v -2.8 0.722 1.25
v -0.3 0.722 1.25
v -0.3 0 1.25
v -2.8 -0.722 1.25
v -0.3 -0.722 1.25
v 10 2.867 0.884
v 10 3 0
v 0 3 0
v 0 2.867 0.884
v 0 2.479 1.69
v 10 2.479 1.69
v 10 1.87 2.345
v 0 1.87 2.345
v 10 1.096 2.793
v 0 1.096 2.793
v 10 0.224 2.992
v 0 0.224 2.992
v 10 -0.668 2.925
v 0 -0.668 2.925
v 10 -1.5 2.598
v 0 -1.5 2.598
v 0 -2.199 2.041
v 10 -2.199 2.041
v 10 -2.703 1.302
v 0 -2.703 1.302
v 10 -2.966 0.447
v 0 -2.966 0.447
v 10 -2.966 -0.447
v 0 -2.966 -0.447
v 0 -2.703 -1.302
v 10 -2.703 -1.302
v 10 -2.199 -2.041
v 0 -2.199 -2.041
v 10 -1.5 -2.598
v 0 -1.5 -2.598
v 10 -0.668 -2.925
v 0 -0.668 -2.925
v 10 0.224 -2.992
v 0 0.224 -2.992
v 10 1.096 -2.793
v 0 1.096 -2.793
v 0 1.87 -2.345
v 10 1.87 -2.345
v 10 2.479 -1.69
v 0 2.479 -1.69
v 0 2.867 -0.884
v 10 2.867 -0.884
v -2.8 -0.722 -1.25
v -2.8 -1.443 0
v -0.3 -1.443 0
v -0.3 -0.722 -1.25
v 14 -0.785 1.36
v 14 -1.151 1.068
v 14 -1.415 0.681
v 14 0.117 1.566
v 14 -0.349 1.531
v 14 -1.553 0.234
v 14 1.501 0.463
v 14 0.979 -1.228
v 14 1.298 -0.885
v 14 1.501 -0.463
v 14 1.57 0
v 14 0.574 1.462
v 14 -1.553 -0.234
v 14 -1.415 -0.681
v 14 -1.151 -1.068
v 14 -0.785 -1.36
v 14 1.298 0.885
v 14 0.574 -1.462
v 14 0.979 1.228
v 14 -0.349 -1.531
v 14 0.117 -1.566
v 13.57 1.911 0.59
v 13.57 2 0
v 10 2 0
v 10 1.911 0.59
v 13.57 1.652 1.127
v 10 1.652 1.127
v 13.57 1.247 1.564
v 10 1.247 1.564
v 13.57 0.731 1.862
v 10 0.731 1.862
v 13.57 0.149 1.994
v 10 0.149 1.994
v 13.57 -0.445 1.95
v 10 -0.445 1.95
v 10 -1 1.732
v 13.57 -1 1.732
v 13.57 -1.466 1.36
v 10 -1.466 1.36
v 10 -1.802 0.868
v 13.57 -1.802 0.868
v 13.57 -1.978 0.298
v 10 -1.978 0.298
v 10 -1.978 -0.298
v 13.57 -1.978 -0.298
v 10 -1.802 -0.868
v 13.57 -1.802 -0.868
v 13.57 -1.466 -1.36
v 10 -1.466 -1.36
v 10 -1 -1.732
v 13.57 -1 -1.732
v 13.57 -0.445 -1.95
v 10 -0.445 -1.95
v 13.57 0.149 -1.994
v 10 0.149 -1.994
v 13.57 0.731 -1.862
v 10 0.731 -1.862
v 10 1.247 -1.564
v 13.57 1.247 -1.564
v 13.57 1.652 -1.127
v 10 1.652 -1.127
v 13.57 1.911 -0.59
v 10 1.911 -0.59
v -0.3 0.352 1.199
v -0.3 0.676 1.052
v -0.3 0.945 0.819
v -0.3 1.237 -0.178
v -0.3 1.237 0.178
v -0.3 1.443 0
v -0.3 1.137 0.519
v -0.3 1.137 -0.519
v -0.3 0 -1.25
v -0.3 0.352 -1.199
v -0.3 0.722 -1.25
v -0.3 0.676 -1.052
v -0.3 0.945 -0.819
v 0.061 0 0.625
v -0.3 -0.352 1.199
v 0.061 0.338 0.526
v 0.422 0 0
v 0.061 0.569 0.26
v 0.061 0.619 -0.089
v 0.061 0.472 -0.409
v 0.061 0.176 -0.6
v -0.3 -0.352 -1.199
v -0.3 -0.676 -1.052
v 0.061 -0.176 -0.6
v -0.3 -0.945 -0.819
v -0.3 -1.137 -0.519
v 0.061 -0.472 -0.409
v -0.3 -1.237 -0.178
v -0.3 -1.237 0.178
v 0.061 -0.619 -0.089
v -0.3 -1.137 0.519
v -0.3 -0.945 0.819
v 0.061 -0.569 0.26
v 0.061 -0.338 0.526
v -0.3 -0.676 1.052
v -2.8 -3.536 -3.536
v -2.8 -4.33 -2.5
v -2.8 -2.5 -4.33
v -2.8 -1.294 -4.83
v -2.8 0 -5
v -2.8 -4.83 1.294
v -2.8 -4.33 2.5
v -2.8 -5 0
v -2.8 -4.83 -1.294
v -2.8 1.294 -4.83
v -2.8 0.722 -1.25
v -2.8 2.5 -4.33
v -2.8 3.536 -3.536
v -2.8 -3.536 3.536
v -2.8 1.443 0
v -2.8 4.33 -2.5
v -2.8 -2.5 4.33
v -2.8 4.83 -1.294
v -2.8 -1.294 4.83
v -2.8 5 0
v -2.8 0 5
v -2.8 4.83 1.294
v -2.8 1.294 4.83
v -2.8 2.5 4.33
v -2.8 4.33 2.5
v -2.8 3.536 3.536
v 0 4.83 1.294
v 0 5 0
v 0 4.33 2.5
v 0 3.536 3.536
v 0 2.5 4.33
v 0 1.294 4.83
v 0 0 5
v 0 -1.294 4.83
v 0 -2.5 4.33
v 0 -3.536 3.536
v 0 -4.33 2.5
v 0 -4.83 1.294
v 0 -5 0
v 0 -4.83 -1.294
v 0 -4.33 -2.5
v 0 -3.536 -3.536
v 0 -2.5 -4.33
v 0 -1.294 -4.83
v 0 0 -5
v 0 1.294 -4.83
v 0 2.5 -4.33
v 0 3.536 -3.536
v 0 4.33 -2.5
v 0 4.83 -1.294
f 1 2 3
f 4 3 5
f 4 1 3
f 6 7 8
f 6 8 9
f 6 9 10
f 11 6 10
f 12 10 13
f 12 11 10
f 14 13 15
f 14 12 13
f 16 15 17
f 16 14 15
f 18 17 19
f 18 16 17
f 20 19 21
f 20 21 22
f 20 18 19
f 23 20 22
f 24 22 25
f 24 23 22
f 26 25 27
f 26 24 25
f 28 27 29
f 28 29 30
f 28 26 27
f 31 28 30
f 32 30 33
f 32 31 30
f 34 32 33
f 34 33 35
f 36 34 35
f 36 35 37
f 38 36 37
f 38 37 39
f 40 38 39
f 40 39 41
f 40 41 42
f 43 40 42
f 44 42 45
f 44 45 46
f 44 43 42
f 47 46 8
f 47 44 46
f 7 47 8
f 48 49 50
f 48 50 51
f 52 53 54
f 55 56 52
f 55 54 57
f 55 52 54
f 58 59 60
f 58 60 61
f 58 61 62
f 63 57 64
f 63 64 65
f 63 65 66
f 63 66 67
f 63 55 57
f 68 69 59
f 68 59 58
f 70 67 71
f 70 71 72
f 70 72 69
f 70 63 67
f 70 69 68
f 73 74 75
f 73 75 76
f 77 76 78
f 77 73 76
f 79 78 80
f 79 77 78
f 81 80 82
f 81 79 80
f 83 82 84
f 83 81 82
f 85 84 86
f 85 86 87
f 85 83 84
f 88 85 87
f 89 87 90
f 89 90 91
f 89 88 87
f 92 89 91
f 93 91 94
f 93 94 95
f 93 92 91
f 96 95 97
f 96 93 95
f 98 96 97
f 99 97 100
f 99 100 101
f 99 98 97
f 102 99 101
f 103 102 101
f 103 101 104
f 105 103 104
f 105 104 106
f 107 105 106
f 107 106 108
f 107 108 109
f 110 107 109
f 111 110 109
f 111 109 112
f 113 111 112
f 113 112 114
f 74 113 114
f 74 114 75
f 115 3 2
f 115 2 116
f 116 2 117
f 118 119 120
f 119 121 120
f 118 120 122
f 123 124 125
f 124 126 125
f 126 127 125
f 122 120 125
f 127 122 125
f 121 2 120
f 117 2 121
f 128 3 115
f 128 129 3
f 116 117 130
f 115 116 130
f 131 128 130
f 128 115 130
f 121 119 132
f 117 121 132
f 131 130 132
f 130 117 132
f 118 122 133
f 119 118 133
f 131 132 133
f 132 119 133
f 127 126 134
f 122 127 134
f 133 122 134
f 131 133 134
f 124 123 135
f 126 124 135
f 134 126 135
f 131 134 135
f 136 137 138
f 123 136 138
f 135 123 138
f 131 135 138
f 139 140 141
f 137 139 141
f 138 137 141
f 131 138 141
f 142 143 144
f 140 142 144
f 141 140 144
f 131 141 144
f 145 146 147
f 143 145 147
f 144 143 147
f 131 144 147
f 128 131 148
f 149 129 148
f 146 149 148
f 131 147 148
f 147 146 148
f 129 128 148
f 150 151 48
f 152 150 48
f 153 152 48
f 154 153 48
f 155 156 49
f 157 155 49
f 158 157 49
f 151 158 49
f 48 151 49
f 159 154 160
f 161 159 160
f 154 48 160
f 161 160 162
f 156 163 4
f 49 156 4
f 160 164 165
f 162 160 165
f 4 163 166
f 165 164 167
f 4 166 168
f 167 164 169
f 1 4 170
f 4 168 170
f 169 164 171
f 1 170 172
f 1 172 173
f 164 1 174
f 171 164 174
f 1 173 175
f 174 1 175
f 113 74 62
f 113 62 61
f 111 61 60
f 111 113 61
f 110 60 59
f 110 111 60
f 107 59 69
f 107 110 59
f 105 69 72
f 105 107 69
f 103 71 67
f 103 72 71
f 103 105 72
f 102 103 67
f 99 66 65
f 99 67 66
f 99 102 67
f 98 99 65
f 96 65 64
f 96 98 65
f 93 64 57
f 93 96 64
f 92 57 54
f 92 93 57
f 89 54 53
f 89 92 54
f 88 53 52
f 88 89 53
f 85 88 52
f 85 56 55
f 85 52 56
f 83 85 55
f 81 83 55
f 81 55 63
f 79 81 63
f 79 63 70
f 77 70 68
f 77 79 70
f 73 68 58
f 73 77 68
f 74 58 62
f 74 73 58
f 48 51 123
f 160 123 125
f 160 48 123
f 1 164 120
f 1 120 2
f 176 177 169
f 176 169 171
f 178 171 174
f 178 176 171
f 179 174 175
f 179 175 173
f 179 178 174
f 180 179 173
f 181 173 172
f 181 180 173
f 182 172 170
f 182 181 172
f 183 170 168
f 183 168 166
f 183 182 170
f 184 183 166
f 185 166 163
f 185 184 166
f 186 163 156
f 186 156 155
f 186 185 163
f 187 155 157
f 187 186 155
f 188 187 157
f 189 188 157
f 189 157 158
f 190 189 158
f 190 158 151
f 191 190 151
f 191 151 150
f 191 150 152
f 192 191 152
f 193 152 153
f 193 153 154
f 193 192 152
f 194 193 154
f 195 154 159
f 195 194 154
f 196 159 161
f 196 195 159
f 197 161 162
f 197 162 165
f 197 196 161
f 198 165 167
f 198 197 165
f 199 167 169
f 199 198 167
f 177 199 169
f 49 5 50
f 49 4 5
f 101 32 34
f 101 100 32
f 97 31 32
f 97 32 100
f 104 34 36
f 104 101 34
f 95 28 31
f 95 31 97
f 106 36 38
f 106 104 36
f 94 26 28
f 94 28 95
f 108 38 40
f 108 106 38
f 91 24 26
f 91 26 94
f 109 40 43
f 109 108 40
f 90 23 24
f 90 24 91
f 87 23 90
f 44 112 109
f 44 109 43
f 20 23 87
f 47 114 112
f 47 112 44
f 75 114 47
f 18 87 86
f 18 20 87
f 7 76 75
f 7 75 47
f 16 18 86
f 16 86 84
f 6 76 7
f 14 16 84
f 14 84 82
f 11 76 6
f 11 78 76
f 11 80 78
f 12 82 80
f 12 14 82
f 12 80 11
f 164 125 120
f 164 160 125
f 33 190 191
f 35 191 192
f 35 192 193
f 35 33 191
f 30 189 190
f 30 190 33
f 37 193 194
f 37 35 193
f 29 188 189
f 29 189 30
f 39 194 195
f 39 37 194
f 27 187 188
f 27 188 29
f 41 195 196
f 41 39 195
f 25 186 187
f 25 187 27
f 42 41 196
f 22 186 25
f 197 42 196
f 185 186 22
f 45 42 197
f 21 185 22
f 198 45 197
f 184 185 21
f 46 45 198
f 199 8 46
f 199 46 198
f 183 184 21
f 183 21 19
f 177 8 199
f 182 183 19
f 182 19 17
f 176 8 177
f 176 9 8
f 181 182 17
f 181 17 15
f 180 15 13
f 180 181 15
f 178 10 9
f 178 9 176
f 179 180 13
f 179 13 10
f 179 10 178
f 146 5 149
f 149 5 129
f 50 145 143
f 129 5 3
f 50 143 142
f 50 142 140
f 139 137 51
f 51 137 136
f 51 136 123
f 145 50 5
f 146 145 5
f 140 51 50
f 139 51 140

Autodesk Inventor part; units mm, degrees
ref_plane "YZ Plane" through (0, 0, 0) normal (1, 0, 0) x (0, 1, 0)
ref_plane "XZ Plane" through (0, 0, 0) normal (0, 1, 0) x (-1, 0, 0)
ref_plane "XY Plane" through (0, 0, 0) normal (0, 0, 1) x (1, 0, 0)
sketch "Sketch_1" plane through (0, 0, 0) normal (0, 0, 1) x (1, 0, 0)
  line L0 (10, 0) -> (-2.8, 0)
  line L1 (-2.8, 0) -> (-2.8, 5)
  line L2 (-2.8, 5) -> (0, 5)
  line L3 (0, 5) -> (0, 3)
  line L4 (0, 3) -> (10, 3)
  line L5 (10, 3) -> (10, 0)
  line L6 (10, 0) -> (-2.8, 0)
revolve "Revolution1" add sketch "Sketch_1" angle 360 about axis through (10, 0, 0) along (1, 0, 0)
sketch "Sketch2" plane through (-2.8, 0, 0) normal (-1, 0, 0) x (0, 0, 1)
  point P0 (0, 0)
hole "Hole1" at (-2.8, 0, 0) direction (1, 0, 0) diameter 2.5 depth 2.5 tip angle 120
sketch "Sketch_3" plane through (-2.8, 0, 0) normal (1, 0, 0) x (0, 0, -1)
  line L0 (-1.25, -0.7217) -> (0, -1.4434)
  line L1 (0, -1.4434) -> (1.25, -0.7217)
  line L2 (1.25, -0.7217) -> (1.25, 0.7217)
  line L3 (1.25, 0.7217) -> (0, 1.4434)
  line L4 (0, 1.4434) -> (-1.25, 0.7217)
  line L5 (-1.25, 0.7217) -> (-1.25, -0.7217)
extrude "Extrusion1" cut sketch "Sketch_3" along normal blind 2.5
sketch "Sketch_6" plane through (0, 0, 0) normal (0, 0, 1) x (1, 0, 0)
  line L0 (14, 0) -> (10, 0)
  line L1 (10, 0) -> (10, 2)
  line L2 (10, 2) -> (13.5705, 2)
  line L3 (13.5705, 2) -> (14, 1.5705)
  line L4 (14, 1.5705) -> (14, 0)
  line L5 (14, 0) -> (10, 0)
revolve "Revolution2" add sketch "Sketch_6" angle 360 about axis through (14, 0, 0) along (1, 0, 0)
thread "Thread1" size "M4x0.7" class "6g" standard "ISO Metric profile" length 2.3705
properties part number "DBTS4-10-4"
